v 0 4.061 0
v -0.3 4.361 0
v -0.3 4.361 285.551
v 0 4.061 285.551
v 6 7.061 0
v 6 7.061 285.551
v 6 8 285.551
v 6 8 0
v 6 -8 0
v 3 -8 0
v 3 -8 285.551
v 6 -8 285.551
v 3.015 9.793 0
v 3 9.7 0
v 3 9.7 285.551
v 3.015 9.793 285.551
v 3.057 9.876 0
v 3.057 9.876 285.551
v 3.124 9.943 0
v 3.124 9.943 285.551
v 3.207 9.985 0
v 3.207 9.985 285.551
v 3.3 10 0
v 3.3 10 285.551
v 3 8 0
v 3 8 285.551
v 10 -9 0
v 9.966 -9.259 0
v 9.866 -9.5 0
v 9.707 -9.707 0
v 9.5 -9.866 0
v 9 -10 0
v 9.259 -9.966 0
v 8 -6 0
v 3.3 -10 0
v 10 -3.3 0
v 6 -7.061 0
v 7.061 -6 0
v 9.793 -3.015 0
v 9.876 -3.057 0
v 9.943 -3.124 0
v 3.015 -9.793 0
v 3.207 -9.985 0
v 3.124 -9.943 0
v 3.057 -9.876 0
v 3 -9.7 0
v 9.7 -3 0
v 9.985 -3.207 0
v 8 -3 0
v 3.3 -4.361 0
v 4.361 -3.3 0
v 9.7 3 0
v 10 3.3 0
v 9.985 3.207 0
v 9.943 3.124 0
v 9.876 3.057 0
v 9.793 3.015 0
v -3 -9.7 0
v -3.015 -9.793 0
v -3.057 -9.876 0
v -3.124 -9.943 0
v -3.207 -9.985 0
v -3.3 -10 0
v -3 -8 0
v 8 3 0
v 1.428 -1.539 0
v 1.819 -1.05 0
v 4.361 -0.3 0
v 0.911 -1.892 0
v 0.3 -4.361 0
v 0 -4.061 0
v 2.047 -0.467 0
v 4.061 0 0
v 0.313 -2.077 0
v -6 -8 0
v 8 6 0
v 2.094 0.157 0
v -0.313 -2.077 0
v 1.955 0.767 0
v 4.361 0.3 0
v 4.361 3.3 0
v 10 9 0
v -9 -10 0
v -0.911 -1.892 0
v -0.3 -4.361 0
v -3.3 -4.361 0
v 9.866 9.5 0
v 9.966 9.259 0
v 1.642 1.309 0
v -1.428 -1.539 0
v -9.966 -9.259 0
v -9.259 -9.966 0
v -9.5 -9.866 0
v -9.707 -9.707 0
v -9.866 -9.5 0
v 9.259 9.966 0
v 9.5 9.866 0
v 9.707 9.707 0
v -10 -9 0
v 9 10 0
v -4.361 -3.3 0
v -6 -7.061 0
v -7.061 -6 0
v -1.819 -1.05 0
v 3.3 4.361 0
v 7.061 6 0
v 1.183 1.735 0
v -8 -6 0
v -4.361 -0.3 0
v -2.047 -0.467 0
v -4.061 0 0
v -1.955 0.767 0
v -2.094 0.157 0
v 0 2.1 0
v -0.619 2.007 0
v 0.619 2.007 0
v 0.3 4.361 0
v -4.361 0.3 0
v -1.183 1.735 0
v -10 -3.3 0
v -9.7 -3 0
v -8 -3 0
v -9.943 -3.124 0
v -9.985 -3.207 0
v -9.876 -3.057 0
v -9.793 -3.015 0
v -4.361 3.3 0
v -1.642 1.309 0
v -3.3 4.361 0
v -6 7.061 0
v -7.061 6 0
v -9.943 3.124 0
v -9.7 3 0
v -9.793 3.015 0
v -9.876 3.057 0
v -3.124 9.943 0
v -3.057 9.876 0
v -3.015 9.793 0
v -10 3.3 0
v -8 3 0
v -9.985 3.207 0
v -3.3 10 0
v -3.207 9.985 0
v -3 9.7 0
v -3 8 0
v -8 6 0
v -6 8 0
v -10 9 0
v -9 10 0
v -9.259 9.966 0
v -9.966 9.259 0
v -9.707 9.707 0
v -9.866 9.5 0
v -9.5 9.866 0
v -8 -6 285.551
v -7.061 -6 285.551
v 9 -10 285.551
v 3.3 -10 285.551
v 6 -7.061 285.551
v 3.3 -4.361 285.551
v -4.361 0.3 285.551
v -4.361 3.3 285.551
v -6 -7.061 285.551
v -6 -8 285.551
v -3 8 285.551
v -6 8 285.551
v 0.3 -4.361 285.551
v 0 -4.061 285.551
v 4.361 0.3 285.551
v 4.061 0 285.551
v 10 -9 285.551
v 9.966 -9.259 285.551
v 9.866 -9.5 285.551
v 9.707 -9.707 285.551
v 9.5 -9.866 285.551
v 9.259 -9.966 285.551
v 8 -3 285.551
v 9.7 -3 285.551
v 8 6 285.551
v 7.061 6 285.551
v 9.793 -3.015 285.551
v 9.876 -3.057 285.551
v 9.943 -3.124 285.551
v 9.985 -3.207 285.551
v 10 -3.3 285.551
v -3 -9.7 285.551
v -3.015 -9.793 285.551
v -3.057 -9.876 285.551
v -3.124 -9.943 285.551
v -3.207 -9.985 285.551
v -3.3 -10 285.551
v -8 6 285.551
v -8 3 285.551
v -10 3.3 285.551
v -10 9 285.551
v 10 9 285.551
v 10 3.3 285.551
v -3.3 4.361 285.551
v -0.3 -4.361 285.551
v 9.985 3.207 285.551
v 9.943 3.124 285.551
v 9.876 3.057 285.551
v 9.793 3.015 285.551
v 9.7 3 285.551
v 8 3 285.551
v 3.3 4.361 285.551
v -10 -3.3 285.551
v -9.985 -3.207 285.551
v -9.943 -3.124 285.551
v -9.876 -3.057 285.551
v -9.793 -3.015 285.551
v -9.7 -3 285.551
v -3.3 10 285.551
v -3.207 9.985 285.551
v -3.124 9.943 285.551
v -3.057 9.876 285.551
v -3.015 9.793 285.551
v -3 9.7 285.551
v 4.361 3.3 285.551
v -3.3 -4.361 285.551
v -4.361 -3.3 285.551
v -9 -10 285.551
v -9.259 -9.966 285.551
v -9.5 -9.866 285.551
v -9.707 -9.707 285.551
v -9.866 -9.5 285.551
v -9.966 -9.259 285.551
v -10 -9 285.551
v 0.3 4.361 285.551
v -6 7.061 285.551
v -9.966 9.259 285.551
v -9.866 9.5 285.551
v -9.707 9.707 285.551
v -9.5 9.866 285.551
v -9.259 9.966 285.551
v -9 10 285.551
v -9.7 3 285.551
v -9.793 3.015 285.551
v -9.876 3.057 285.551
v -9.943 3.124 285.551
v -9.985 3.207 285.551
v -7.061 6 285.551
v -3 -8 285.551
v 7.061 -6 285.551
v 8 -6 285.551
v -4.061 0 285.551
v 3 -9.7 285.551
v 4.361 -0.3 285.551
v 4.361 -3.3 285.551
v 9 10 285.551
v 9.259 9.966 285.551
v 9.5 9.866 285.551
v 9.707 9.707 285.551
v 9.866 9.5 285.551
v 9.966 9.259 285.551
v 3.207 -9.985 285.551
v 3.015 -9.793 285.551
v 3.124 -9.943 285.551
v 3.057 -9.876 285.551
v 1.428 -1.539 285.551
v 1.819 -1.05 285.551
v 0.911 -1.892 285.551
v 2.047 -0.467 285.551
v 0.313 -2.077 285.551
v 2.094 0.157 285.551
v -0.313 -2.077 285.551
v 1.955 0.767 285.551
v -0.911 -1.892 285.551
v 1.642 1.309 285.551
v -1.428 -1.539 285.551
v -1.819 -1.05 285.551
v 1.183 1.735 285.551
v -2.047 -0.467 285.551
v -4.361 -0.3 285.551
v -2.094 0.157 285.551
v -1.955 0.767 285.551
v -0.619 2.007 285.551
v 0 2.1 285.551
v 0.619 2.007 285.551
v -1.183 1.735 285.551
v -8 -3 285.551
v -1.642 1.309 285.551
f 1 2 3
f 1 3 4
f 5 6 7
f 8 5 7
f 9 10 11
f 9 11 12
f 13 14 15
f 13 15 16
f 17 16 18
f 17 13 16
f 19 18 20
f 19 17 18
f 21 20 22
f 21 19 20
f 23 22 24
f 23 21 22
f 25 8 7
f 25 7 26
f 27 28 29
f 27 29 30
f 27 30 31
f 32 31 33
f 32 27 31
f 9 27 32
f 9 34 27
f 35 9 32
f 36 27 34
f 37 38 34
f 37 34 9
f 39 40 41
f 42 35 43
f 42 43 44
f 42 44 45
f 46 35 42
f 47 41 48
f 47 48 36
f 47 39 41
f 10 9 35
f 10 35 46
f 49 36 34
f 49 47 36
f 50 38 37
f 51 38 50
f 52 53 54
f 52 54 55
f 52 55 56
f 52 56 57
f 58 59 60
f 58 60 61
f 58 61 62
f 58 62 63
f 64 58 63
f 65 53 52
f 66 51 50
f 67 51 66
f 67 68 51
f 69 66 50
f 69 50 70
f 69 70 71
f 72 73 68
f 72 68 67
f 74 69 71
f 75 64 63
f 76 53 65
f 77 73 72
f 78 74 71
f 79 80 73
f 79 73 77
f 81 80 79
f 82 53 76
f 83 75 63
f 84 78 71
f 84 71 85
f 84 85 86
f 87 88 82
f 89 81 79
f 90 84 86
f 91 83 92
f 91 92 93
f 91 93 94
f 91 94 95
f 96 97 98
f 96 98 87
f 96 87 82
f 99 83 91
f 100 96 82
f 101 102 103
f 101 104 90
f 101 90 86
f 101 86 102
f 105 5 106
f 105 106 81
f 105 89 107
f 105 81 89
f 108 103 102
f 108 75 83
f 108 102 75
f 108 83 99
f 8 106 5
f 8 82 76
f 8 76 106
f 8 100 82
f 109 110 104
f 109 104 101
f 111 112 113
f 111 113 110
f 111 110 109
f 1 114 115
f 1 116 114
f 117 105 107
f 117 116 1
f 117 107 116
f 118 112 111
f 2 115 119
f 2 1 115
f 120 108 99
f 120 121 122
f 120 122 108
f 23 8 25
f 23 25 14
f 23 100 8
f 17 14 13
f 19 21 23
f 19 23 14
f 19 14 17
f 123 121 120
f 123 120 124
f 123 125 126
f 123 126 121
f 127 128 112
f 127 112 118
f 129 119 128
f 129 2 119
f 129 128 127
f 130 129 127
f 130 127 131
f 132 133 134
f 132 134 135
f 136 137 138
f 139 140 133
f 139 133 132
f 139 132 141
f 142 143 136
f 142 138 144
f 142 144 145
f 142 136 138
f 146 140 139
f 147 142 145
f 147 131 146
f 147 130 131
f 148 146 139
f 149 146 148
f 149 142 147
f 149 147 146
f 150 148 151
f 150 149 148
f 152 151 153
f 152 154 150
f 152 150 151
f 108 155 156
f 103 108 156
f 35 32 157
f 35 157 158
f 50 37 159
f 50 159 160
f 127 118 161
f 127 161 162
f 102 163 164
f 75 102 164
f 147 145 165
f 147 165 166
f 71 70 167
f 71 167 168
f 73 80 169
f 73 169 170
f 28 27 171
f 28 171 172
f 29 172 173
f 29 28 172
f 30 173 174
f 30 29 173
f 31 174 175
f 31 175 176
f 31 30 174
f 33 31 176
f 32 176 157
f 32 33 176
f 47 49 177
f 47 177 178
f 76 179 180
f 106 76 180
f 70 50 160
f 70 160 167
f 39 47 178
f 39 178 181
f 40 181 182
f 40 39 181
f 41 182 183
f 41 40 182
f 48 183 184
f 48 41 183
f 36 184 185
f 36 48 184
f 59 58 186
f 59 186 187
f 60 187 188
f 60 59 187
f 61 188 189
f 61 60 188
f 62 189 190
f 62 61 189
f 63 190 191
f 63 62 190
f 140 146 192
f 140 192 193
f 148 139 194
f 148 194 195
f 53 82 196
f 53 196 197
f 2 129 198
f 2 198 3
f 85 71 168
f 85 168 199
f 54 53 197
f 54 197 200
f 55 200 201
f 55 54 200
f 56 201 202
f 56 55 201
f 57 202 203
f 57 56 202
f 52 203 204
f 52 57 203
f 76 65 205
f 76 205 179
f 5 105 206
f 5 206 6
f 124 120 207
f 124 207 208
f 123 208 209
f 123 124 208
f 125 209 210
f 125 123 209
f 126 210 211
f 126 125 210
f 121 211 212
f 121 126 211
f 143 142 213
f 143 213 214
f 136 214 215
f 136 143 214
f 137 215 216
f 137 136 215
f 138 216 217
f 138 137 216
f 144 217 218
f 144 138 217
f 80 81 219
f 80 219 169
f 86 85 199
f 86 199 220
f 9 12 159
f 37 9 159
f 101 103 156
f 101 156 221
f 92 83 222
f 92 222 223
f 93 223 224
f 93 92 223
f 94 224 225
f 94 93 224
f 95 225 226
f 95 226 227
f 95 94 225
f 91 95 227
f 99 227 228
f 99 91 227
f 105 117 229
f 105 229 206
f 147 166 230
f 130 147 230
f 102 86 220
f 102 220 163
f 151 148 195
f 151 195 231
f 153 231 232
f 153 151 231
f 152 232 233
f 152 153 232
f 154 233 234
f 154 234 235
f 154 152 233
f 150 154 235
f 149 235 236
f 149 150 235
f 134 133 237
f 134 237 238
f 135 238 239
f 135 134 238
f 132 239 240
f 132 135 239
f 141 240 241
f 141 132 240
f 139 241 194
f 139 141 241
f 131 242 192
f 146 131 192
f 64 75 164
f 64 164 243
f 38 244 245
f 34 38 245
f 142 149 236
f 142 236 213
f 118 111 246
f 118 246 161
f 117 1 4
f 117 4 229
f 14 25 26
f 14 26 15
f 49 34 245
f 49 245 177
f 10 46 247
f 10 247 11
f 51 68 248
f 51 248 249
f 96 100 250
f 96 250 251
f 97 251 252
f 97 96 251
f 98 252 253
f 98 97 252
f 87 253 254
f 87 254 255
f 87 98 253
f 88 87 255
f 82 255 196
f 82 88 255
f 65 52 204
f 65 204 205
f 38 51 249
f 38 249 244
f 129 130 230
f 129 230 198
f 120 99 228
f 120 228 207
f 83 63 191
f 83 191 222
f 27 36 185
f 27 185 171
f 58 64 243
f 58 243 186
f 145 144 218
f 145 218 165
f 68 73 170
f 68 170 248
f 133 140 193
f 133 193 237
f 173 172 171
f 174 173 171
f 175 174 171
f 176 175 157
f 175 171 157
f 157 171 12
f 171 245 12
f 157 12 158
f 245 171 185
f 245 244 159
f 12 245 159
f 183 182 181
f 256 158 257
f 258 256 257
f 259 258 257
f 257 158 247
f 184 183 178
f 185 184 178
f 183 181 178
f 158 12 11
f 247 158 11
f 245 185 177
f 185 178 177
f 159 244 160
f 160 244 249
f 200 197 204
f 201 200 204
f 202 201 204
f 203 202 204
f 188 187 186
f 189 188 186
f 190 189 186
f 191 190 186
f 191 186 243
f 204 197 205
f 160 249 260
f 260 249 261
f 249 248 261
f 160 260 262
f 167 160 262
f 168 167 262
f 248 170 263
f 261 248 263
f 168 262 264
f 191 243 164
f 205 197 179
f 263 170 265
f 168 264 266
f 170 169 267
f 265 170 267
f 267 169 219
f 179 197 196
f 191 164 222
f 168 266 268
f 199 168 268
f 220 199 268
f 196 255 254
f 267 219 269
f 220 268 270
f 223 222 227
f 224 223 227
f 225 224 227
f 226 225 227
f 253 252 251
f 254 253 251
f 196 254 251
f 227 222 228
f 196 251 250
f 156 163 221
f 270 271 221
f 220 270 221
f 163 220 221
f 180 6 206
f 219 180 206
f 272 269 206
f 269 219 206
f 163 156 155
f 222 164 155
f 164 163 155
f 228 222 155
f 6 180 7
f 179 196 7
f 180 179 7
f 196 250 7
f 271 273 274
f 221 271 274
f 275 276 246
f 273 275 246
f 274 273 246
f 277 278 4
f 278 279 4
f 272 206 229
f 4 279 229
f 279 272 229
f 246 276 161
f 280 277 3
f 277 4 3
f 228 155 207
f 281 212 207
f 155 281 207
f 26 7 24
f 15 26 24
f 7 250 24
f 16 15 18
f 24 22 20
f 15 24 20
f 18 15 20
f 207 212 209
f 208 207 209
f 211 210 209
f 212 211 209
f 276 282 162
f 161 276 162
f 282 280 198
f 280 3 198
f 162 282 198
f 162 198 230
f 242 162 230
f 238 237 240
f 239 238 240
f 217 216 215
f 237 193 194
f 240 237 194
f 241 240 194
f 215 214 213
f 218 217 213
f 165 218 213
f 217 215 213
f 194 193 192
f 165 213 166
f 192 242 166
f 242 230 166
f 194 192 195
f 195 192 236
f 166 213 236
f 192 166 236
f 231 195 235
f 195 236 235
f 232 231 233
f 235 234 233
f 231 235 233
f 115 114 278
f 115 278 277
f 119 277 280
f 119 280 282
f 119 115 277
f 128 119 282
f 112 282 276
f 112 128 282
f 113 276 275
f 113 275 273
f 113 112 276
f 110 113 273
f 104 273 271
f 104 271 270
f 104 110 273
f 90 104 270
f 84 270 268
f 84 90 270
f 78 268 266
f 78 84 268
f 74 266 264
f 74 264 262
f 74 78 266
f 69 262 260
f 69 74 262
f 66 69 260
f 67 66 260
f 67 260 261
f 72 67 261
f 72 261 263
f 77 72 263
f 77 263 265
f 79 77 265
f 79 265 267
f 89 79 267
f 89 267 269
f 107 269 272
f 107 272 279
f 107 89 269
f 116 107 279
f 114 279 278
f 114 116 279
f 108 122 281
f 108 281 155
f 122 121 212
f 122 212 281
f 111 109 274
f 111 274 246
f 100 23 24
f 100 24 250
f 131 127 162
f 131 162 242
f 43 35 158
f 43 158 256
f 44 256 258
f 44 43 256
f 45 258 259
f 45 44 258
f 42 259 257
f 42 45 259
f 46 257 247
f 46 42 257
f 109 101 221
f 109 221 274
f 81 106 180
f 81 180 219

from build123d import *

# Parameters (mm, degrees)
SKETCH1_R           = 2.1
BOSS_EXTRUDE1_DEPTH = 285.550937794


with BuildPart() as part:
    # Sketch1 → Boss-Extrude1 (new body)
    with BuildSketch(Plane.XY):
        with BuildLine():
            Line((3.3, 4.360660172), (6.000039828, 7.0607))
            Line((6.000039828, 7.0607), (6.000039828, 8))
            Line((6.000039828, 8), (3.000039828, 8))
            Line((3.000039828, 8), (3.000039828, 9.7))
            ThreePointArc((3.000039828, 9.7), (3.087907794, 9.912132034), (3.300039828, 10))
            Line((3.300039828, 10), (9, 10))
            ThreePointArc((9, 10), (9.707106781, 9.707106781), (10, 9))
            Line((10, 9), (10, 3.300039828))
            ThreePointArc((10, 3.300039828), (9.912132034, 3.087907794), (9.7, 3.000039828))
            Line((9.7, 3.000039828), (8, 3.000039828))
            Line((8, 3.000039828), (8, 6.000039828))
            Line((8, 6.000039828), (7.0607, 6.000039828))
            Line((7.0607, 6.000039828), (4.360660172, 3.3))
            Line((4.360660172, 3.3), (4.360660172, 0.3))
            Line((4.360660172, 0.3), (4.060660172, 0))
            Line((4.060660172, 0), (4.360660172, -0.3))
            Line((4.360660172, -0.3), (4.360660172, -3.3))
            Line((4.360660172, -3.3), (7.0607, -6.000039828))
            Line((7.0607, -6.000039828), (8, -6.000039828))
            Line((8, -6.000039828), (8, -3.000039828))
            Line((8, -3.000039828), (9.7, -3.000039828))
            ThreePointArc((9.7, -3.000039828), (9.912132034, -3.087907794), (10, -3.300039828))
            Line((10, -3.300039828), (10, -9))
            ThreePointArc((10, -9), (9.707106781, -9.707106781), (9, -10))
            Line((9, -10), (3.300039828, -10))
            ThreePointArc((3.300039828, -10), (3.087907794, -9.912132034), (3.000039828, -9.7))
            Line((3.000039828, -9.7), (3.000039828, -8))
            Line((3.000039828, -8), (6.000039828, -8))
            Line((6.000039828, -8), (6.000039828, -7.0607))
            Line((6.000039828, -7.0607), (3.3, -4.360660172))
            Line((3.3, -4.360660172), (0.3, -4.360660172))
            Line((0.3, -4.360660172), (0, -4.060660172))
            Line((0, -4.060660172), (-0.3, -4.360660172))
            Line((-0.3, -4.360660172), (-3.3, -4.360660172))
            Line((-3.3, -4.360660172), (-6.000039828, -7.0607))
            Line((-6.000039828, -7.0607), (-6.000039828, -8))
            Line((-6.000039828, -8), (-3.000039828, -8))
            Line((-3.000039828, -8), (-3.000039828, -9.7))
            ThreePointArc((-3.000039828, -9.7), (-3.087907794, -9.912132034), (-3.300039828, -10))
            Line((-3.300039828, -10), (-9, -10))
            ThreePointArc((-9, -10), (-9.707106781, -9.707106781), (-10, -9))
            Line((-10, -9), (-10, -3.300039828))
            ThreePointArc((-10, -3.300039828), (-9.912132034, -3.087907794), (-9.7, -3.000039828))
            Line((-9.7, -3.000039828), (-8, -3.000039828))
            Line((-8, -3.000039828), (-8, -6.000039828))
            Line((-8, -6.000039828), (-7.0607, -6.000039828))
            Line((-7.0607, -6.000039828), (-4.360660172, -3.3))
            Line((-4.360660172, -3.3), (-4.360660172, -0.3))
            Line((-4.360660172, -0.3), (-4.060660172, 0))
            Line((-4.060660172, 0), (-4.360660172, 0.3))
            Line((-4.360660172, 0.3), (-4.360660172, 3.3))
            Line((-4.360660172, 3.3), (-7.0607, 6.000039828))
            Line((-7.0607, 6.000039828), (-8, 6.000039828))
            Line((-8, 6.000039828), (-8, 3.000039828))
            Line((-8, 3.000039828), (-9.7, 3.000039828))
            ThreePointArc((-9.7, 3.000039828), (-9.912132034, 3.087907794), (-10, 3.300039828))
            Line((-10, 3.300039828), (-10, 9))
            ThreePointArc((-10, 9), (-9.707106781, 9.707106781), (-9, 10))
            Line((-9, 10), (-3.300039828, 10))
            ThreePointArc((-3.300039828, 10), (-3.087907794, 9.912132034), (-3.000039828, 9.7))
            Line((-3.000039828, 9.7), (-3.000039828, 8))
            Line((-3.000039828, 8), (-6.000039828, 8))
            Line((-6.000039828, 8), (-6.000039828, 7.0607))
            Line((-6.000039828, 7.0607), (-3.3, 4.360660172))
            Line((-3.3, 4.360660172), (-0.3, 4.360660172))
            Line((-0.3, 4.360660172), (0, 4.060660172))
            Line((0, 4.060660172), (0.3, 4.360660172))
            Line((0.3, 4.360660172), (3.3, 4.360660172))
        make_face()
        with Locations(Location((0, 0, 0), (0, 0, 90))):
            Circle(SKETCH1_R, mode=Mode.SUBTRACT)
    extrude(amount=BOSS_EXTRUDE1_DEPTH)


solid = part.part
